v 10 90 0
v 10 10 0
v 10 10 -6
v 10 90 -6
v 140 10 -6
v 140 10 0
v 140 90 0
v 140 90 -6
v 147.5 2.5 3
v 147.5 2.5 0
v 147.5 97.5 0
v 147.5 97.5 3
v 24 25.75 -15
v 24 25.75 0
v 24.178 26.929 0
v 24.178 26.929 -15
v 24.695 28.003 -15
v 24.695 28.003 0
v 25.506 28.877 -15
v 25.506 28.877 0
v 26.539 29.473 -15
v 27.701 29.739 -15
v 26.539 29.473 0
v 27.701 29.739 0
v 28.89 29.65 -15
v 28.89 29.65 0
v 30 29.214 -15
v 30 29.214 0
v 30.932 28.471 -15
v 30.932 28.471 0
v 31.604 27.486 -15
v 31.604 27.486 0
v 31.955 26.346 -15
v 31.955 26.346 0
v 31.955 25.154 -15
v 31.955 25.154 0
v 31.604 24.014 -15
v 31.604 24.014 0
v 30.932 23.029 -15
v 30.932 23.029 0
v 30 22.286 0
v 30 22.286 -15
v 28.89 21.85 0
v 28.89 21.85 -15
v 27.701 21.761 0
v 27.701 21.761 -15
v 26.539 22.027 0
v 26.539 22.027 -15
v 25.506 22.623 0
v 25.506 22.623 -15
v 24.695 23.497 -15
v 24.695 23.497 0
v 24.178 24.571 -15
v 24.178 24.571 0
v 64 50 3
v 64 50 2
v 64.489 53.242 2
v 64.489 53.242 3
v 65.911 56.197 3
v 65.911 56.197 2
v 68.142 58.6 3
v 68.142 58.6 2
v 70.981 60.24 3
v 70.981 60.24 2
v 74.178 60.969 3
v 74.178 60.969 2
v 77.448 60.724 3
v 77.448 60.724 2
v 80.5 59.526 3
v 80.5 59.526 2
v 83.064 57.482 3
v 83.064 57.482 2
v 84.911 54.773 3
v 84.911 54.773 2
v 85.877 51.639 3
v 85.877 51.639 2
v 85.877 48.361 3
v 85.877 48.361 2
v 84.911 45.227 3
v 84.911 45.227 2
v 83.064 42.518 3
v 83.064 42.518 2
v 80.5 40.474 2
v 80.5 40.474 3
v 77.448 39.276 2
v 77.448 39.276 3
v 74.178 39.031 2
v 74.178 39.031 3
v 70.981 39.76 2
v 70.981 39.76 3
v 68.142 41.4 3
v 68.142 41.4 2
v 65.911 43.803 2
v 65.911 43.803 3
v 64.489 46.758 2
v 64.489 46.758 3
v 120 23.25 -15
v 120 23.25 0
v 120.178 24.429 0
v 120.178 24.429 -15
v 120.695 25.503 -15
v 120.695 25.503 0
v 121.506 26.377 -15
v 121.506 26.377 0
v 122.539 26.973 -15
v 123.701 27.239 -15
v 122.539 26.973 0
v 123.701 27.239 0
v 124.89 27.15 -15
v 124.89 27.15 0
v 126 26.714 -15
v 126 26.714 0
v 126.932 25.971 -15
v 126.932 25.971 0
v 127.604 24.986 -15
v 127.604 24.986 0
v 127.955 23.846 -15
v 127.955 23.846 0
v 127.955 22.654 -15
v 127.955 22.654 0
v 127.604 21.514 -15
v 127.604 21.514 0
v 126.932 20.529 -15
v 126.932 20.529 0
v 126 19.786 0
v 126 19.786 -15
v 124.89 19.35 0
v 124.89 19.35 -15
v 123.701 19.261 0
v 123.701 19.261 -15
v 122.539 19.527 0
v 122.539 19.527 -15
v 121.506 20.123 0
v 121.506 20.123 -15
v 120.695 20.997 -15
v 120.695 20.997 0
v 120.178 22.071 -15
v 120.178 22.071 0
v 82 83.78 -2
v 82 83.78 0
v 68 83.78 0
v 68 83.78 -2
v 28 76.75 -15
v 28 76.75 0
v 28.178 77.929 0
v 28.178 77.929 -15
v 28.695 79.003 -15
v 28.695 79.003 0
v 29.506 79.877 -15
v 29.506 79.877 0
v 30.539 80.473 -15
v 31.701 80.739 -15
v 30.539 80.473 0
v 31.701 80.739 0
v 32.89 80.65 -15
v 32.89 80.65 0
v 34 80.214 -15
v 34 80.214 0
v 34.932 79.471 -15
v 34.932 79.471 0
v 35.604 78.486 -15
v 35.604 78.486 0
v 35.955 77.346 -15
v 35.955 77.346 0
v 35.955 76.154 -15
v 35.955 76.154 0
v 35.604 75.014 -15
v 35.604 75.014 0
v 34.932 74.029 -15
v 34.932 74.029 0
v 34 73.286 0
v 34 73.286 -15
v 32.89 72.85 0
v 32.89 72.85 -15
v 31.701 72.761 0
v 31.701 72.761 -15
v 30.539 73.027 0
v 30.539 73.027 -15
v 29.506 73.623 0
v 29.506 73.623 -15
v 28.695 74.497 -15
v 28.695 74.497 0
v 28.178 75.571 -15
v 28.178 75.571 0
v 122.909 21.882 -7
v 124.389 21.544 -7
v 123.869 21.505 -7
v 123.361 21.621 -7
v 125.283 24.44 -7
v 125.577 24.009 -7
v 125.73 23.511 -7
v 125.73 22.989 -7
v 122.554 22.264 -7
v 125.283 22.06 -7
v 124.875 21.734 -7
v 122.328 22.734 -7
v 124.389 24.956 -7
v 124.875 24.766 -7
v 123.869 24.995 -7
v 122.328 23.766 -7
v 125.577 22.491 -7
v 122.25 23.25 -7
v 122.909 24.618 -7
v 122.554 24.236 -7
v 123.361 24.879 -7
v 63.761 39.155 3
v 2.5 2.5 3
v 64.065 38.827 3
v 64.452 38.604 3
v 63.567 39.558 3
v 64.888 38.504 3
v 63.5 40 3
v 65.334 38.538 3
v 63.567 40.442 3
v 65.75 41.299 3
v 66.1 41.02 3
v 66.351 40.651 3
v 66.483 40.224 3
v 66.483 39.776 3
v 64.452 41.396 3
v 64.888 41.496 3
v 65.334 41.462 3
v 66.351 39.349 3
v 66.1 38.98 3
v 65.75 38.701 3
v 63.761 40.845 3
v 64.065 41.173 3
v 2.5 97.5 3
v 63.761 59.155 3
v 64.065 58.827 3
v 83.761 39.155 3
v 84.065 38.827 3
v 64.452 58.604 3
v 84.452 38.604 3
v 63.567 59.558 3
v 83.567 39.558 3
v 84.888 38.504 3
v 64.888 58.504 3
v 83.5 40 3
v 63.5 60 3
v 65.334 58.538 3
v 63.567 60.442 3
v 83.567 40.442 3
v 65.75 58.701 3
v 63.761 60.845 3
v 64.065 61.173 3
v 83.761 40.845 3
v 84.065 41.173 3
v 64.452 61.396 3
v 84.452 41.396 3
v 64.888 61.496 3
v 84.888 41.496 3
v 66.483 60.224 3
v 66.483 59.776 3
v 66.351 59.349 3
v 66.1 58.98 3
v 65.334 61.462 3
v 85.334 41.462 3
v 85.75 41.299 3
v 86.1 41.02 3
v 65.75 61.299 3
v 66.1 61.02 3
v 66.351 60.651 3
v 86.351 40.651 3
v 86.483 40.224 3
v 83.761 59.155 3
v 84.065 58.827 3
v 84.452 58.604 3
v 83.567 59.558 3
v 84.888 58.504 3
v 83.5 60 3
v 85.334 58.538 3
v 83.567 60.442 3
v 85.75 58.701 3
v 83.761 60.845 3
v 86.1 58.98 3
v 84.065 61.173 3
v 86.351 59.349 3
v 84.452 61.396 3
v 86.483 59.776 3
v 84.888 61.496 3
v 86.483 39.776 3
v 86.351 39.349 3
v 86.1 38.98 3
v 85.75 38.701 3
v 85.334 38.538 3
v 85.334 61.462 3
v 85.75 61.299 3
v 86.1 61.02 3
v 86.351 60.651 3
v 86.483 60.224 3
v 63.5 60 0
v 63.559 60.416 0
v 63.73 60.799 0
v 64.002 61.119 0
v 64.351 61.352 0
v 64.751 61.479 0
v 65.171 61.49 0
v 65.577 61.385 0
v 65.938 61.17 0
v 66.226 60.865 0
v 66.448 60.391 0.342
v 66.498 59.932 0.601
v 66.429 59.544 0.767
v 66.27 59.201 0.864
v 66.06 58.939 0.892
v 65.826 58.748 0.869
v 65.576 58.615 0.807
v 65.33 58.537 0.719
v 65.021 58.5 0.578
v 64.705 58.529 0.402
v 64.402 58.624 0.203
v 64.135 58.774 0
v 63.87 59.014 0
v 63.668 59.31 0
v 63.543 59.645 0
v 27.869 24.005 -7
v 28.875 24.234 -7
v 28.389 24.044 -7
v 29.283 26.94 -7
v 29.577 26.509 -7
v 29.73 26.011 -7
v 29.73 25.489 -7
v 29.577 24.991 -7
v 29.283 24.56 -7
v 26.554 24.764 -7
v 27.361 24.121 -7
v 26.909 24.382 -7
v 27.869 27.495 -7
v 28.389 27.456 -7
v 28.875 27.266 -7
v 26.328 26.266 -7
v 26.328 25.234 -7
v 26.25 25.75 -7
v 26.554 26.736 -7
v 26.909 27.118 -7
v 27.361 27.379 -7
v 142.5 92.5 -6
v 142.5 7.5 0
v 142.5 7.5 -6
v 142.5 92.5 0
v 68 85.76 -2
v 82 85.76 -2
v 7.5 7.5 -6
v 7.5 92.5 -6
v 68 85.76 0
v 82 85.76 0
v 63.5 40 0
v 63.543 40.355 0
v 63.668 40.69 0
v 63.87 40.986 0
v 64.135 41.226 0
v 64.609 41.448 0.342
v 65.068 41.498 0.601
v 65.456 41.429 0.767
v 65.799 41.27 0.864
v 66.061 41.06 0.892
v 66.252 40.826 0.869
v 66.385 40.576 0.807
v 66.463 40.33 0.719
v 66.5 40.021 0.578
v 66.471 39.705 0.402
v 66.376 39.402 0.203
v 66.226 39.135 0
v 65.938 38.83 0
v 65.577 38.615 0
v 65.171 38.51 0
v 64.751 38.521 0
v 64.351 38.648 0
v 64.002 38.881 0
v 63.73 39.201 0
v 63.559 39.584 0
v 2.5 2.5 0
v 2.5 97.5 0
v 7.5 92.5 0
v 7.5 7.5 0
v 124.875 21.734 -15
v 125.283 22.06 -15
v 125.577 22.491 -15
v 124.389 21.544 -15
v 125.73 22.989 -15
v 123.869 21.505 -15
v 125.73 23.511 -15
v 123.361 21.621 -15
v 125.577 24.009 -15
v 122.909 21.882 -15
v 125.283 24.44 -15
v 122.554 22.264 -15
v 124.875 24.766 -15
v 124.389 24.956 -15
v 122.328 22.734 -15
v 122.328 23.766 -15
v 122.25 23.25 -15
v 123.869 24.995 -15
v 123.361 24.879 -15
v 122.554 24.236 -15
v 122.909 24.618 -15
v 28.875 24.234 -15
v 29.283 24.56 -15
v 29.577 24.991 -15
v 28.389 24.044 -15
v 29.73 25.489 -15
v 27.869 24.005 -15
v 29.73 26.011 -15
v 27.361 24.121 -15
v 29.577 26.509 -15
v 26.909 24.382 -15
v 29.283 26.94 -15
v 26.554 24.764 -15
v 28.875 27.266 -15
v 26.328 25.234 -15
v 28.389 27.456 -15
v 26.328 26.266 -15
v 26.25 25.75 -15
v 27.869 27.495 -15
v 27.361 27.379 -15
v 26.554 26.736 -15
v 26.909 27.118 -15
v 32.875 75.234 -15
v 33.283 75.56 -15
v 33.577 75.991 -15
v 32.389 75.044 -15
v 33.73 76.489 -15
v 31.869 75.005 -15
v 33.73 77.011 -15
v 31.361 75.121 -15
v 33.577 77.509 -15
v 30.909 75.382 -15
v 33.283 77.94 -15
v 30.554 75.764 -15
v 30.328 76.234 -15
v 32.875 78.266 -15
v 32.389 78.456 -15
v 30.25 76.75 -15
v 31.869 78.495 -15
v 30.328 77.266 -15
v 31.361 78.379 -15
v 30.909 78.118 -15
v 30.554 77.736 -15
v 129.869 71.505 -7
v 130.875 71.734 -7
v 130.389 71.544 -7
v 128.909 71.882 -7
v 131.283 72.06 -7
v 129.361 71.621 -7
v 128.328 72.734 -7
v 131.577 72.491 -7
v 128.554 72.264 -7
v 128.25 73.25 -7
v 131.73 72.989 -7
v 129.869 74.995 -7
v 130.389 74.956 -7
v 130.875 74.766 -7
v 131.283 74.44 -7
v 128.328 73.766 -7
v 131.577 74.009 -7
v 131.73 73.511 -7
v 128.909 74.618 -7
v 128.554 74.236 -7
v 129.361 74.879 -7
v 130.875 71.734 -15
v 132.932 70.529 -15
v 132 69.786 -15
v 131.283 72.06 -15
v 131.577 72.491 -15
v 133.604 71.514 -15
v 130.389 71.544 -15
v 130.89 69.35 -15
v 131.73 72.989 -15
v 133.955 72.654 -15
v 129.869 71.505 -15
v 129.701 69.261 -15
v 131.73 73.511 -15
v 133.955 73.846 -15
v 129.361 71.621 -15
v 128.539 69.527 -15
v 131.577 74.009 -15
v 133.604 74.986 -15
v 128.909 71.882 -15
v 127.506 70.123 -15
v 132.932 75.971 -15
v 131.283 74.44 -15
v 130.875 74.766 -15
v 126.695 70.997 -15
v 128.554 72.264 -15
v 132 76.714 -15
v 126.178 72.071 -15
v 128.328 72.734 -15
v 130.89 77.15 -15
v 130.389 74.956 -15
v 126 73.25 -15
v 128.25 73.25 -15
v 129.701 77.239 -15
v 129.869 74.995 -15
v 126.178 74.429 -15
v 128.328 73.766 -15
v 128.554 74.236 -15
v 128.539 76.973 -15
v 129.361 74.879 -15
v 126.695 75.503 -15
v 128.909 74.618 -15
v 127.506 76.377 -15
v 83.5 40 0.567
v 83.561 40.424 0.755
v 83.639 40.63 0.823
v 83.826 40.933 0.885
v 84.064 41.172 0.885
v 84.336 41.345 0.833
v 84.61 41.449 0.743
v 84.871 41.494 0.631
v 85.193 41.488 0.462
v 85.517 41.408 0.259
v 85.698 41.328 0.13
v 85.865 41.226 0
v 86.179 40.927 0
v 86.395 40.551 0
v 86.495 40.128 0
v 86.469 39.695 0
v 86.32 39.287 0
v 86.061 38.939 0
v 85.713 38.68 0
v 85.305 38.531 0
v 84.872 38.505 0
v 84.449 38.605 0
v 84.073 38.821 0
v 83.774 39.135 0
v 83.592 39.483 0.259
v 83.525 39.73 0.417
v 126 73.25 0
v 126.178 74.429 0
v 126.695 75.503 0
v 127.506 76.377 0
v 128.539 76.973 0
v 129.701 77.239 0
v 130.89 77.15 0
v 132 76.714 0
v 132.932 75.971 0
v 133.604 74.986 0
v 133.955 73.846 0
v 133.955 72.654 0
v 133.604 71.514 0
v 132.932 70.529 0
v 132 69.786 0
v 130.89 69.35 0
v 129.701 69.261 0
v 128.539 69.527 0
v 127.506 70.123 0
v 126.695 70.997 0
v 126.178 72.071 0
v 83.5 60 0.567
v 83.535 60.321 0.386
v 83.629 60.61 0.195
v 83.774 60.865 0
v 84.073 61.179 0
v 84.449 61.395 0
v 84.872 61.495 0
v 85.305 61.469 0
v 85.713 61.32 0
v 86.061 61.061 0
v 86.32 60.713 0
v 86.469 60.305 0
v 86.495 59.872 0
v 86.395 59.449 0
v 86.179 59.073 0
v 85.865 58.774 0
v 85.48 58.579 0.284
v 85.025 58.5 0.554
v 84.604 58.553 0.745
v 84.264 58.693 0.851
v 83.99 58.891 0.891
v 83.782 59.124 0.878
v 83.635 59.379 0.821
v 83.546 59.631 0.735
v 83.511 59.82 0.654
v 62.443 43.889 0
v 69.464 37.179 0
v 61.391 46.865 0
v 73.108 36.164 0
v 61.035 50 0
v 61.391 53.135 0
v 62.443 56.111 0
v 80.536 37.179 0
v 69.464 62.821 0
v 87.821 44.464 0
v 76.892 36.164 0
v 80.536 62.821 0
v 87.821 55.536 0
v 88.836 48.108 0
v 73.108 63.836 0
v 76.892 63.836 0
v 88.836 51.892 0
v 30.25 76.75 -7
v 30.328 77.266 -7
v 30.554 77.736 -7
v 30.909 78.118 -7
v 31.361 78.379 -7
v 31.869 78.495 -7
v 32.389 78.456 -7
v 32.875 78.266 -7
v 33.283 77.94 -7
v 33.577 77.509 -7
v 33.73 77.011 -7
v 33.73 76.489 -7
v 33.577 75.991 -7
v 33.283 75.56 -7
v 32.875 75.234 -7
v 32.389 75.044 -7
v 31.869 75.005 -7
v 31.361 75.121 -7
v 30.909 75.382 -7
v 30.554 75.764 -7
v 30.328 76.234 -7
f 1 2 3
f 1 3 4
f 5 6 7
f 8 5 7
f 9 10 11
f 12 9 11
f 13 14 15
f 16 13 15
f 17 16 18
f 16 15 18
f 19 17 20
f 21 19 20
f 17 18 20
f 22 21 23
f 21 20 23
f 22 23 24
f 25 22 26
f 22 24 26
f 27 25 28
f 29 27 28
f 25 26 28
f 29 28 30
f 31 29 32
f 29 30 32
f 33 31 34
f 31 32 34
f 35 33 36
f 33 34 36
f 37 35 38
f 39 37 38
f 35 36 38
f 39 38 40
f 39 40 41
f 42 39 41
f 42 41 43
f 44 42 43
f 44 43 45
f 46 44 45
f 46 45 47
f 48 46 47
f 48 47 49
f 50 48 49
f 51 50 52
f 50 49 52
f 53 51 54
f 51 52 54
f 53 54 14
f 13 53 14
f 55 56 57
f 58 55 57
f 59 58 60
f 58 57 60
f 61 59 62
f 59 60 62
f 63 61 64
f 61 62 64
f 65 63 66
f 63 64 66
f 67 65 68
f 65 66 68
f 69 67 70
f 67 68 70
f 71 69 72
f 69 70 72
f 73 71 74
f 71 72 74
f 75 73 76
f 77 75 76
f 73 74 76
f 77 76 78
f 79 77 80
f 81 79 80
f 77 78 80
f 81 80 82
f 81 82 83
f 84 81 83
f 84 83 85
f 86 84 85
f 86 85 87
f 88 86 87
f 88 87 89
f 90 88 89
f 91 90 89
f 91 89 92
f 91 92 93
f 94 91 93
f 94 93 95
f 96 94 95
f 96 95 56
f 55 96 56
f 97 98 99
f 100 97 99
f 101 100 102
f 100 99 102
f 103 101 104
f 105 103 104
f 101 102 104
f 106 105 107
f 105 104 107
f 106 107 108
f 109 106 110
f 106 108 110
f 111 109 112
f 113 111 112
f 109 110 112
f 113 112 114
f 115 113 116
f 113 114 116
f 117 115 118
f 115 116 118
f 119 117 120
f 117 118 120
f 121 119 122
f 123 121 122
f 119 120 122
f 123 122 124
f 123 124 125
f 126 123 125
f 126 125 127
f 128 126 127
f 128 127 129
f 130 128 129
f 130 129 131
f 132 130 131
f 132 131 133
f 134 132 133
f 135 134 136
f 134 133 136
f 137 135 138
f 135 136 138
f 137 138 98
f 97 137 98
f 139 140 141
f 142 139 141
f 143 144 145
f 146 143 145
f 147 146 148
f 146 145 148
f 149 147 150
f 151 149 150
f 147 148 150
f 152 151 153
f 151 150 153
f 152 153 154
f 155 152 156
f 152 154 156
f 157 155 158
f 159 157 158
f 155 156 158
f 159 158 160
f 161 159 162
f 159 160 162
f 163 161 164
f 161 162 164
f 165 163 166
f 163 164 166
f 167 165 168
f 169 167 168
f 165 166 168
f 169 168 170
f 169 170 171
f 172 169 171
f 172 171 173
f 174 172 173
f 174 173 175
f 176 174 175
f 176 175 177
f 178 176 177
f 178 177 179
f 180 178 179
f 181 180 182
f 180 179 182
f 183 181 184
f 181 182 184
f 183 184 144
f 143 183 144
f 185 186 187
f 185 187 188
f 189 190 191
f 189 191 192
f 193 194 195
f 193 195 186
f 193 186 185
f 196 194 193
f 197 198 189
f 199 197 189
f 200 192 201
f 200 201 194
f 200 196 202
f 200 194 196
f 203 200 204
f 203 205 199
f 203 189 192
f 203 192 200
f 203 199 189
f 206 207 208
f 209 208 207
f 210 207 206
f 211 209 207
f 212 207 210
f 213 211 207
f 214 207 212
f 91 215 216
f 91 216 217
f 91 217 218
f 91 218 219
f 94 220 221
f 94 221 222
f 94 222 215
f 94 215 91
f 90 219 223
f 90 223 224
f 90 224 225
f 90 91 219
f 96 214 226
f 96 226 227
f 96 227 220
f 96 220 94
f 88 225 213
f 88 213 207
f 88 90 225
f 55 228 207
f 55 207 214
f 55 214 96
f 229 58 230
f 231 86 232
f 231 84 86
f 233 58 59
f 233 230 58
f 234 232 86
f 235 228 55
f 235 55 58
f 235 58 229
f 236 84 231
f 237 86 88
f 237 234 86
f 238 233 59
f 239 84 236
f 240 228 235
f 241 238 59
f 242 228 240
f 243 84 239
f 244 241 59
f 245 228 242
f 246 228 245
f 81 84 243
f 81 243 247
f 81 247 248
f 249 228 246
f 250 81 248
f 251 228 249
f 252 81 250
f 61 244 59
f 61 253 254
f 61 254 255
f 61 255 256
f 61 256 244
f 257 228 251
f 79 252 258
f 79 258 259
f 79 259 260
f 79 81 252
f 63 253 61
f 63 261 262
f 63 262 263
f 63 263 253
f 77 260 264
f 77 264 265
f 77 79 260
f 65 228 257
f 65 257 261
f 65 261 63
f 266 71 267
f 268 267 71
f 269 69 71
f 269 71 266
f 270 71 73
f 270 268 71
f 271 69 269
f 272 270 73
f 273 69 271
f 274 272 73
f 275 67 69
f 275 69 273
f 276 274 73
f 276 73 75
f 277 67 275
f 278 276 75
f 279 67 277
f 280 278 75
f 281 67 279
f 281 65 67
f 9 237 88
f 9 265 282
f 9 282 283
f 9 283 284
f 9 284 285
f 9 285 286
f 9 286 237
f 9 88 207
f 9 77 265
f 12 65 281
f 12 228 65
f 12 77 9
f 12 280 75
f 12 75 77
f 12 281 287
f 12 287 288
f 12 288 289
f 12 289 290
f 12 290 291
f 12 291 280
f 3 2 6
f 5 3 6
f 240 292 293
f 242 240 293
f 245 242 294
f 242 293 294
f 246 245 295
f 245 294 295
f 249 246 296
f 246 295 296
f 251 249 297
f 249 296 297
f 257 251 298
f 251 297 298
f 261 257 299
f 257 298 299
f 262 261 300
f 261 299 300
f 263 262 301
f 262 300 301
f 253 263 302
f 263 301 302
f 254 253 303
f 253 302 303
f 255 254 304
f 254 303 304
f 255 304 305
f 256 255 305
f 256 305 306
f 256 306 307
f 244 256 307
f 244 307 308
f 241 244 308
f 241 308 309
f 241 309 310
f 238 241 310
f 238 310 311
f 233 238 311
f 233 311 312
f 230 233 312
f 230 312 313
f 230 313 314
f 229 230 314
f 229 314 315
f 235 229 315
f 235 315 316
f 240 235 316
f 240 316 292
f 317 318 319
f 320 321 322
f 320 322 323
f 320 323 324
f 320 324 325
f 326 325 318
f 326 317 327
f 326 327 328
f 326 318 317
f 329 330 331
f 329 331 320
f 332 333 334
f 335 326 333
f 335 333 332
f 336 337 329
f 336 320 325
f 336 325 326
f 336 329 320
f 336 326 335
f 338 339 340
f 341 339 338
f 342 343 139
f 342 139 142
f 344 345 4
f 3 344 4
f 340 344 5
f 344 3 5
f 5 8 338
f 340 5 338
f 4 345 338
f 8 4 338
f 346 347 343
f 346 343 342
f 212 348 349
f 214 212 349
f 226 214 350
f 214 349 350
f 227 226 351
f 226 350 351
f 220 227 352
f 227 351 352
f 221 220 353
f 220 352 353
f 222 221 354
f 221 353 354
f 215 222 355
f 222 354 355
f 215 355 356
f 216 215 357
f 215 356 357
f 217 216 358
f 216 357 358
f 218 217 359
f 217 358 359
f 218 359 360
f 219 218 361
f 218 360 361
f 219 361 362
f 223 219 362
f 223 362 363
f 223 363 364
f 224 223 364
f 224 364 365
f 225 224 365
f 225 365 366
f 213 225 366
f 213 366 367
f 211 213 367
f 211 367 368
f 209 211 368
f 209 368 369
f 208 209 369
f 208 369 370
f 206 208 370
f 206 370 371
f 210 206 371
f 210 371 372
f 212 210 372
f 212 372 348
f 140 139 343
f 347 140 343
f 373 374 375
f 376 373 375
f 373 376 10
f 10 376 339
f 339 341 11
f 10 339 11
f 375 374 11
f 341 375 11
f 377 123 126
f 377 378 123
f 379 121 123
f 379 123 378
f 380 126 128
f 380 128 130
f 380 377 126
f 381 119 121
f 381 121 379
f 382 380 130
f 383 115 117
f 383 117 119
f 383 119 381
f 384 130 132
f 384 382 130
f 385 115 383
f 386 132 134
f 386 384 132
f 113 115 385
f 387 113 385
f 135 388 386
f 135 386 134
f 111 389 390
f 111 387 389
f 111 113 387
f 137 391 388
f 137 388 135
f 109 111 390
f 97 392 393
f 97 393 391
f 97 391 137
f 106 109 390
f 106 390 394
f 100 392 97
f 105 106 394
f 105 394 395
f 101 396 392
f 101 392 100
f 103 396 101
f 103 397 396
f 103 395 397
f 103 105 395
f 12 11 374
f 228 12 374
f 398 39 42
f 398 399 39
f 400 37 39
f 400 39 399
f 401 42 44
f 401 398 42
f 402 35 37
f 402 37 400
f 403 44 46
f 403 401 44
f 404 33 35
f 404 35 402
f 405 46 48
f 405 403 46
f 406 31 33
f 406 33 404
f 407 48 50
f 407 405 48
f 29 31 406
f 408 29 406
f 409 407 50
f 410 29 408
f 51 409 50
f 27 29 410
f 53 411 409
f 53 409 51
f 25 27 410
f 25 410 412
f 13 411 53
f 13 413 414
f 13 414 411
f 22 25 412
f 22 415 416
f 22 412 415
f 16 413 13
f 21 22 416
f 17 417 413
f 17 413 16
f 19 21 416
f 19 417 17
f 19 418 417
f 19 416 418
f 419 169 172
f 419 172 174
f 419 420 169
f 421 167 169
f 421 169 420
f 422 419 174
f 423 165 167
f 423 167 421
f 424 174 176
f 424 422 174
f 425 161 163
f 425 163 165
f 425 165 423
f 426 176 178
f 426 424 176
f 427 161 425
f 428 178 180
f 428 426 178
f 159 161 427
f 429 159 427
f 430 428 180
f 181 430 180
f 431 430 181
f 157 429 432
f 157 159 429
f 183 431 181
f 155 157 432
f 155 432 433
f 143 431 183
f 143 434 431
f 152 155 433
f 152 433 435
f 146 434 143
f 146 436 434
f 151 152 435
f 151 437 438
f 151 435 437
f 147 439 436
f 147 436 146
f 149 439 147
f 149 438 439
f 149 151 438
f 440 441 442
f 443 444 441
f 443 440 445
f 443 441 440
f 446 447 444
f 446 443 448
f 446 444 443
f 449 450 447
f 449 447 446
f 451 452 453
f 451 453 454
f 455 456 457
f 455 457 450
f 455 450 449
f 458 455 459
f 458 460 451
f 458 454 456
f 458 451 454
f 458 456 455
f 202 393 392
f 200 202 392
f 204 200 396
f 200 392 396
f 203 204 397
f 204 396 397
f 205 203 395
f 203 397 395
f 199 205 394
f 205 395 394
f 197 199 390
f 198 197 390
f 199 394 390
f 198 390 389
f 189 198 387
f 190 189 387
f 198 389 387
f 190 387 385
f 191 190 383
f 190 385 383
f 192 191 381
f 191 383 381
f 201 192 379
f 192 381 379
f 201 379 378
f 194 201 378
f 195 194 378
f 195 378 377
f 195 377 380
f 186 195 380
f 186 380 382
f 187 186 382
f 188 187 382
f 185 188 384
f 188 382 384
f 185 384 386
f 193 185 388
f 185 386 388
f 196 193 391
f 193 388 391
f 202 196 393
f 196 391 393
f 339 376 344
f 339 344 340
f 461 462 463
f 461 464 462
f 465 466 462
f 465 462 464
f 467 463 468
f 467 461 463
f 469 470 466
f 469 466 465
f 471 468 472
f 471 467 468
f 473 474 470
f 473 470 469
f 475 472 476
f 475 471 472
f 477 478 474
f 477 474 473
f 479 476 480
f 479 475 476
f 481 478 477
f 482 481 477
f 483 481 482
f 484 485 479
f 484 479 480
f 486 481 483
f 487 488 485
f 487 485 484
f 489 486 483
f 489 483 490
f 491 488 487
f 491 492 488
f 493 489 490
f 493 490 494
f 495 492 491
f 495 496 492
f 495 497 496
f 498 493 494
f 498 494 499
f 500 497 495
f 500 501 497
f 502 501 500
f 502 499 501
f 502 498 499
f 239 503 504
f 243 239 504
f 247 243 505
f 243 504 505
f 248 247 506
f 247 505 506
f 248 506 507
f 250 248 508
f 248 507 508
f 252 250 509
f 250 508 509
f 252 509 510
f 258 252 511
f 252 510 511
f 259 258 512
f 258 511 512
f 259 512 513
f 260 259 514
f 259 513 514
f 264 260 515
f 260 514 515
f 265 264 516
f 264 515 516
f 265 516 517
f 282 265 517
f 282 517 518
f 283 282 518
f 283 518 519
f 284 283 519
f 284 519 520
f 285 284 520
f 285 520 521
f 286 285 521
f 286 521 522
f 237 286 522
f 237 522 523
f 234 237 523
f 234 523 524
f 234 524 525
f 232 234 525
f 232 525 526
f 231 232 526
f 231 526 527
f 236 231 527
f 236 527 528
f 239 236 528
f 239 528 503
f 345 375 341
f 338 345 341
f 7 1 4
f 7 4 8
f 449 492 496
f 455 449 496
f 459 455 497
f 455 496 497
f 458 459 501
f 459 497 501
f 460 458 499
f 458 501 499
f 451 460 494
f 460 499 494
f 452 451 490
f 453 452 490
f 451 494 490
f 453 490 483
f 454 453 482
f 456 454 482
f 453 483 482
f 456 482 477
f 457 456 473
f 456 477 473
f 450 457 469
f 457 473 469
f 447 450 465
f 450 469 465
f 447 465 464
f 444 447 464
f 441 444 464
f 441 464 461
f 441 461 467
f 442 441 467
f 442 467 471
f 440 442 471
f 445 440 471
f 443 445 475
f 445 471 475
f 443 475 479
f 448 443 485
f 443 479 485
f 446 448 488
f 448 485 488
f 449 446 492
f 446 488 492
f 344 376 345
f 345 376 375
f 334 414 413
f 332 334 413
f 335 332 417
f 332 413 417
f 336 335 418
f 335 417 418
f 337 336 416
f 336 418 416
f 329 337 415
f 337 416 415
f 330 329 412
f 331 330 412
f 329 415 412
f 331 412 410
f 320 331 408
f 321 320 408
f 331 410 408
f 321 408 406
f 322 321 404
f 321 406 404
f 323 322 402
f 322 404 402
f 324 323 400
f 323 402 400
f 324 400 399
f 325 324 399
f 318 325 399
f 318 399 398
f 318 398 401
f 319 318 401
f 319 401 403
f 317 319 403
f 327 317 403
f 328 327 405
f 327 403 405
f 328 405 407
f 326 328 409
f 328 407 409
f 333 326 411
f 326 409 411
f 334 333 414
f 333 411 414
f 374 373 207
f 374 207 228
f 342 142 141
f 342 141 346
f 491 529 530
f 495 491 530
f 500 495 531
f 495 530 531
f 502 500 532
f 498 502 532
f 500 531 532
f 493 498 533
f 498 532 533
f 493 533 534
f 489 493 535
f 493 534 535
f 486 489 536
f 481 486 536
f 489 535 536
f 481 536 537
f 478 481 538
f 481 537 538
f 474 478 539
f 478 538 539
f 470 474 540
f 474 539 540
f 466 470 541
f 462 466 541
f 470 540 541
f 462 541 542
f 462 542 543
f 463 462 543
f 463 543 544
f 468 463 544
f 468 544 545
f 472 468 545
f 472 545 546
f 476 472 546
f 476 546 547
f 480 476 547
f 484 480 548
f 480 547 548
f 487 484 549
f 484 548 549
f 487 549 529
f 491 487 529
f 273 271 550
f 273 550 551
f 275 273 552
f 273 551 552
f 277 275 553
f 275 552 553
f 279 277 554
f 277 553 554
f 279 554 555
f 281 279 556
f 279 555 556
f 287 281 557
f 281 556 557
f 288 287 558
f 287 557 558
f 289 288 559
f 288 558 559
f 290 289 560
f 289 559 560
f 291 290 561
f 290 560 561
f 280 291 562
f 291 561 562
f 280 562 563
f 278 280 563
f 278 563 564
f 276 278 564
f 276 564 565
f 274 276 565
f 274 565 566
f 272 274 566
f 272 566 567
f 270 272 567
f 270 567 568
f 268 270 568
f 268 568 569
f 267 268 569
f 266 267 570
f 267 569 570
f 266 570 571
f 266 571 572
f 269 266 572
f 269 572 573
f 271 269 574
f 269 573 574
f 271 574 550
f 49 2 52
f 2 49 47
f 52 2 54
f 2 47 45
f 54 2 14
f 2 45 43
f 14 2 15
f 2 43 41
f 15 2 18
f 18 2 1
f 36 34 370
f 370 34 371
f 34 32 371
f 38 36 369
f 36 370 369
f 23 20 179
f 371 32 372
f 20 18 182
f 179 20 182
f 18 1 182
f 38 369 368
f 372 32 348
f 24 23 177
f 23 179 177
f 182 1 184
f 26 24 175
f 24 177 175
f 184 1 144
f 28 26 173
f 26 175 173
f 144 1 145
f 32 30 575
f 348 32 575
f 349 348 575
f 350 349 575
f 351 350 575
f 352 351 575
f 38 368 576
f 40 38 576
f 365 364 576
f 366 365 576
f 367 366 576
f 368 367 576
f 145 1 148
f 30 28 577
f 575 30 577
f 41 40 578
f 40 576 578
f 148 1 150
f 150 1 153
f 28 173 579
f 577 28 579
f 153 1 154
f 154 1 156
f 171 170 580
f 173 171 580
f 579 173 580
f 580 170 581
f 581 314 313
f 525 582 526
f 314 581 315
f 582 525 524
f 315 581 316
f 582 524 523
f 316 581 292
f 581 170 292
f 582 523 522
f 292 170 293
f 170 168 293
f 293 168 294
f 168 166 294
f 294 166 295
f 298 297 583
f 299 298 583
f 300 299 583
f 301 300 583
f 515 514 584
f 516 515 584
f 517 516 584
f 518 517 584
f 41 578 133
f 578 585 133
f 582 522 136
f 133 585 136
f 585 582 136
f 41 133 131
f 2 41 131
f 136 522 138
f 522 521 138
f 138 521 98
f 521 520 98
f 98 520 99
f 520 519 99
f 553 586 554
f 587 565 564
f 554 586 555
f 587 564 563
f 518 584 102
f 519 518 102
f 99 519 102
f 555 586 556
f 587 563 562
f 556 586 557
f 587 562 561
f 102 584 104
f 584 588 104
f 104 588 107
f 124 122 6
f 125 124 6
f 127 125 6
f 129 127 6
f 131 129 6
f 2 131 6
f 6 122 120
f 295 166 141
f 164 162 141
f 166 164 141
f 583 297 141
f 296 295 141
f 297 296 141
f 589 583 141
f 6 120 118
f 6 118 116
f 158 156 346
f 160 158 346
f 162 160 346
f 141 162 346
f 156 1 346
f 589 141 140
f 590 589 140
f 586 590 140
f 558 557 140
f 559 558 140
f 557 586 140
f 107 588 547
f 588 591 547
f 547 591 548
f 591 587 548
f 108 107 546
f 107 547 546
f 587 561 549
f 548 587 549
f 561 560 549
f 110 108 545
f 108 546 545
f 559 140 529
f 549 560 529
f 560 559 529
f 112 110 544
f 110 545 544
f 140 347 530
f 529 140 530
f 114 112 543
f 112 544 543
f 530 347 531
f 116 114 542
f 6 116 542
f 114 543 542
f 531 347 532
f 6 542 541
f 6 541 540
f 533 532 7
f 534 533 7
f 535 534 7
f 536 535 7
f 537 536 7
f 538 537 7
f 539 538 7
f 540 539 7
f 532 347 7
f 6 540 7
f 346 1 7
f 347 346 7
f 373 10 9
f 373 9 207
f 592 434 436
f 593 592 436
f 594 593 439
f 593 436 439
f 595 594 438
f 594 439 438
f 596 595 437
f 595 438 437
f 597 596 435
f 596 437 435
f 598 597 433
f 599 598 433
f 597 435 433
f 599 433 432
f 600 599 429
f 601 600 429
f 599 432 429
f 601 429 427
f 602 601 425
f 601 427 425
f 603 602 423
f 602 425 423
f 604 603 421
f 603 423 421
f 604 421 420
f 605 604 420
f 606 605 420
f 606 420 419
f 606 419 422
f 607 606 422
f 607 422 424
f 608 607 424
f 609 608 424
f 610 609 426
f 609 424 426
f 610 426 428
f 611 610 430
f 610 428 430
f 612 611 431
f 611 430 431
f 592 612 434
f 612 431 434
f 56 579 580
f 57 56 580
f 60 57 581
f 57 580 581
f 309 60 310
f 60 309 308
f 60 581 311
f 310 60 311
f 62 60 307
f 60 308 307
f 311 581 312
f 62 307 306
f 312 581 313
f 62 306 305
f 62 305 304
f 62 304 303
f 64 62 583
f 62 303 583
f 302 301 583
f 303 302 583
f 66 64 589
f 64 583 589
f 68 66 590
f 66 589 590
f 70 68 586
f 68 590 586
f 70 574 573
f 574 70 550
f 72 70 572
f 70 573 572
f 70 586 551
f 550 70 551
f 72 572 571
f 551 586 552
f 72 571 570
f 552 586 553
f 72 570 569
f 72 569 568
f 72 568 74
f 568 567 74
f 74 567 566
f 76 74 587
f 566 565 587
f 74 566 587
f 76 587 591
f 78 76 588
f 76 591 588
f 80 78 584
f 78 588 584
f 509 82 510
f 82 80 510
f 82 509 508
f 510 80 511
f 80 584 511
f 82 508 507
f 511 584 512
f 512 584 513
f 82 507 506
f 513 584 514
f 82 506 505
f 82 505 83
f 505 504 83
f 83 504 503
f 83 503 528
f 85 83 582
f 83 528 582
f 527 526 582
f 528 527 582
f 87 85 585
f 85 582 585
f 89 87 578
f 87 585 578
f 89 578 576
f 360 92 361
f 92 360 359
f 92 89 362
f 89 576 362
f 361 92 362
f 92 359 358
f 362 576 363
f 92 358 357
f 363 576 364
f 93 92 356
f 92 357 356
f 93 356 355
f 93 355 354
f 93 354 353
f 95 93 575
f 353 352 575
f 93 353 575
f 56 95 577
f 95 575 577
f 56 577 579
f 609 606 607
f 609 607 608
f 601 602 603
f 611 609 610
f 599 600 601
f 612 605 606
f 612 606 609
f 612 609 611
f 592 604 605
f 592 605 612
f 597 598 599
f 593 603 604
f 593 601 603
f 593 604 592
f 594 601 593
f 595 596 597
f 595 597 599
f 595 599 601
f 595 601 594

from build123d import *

# Parameters (mm, degrees)
ESBO_O1_W                = 150
ESBO_O1_H                = 100
RESSALTO_EXTRUS_O1_DEPTH = 3
ESBO_O1_3_W              = 135
ESBO_O1_3_H              = 85
ESBO_O1_3_W_2            = 130
ESBO_O1_3_H_2            = 80
RESSALTO_EXTRUS_O2_DEPTH = 6
ESBO_O2_R                = 4
RESSALTO_EXTRUS_O3_DEPTH = 15
ESBO_O3_R                = 1.75
CORTE_EXTRUS_O1_DEPTH    = 8
ESBO_O4_W                = 14
ESBO_O4_H                = 1.980707968
RESSALTO_EXTRUS_O4_DEPTH = 2
ESBO_O5_R                = 11
ESBO_O5_R_2              = 1.5
CORTE_EXTRUS_O2_DEPTH    = 10
CHANFRO1_SIZE            = 2
CHANFRO1_SIZE_2          = 2.965121937
ESBO_O6_W                = 150
ESBO_O6_H                = 100
ESBO_O6_W_2              = 145
ESBO_O6_H_2              = 95
CORTE_EXTRUS_O3_DEPTH    = 10


with BuildPart() as part:
    # Esboço1 → Ressalto-extrusão1 (new body)
    with BuildSketch(Plane.XY):
        with Locations((75, 50)):
            Rectangle(ESBO_O1_W, ESBO_O1_H)
    extrude(amount=RESSALTO_EXTRUS_O1_DEPTH)

    # Esboço1<3> → Ressalto-extrusão2 (add)
    with BuildSketch(Plane.XY):
        with Locations((75, 50)):
            Rectangle(ESBO_O1_3_W, ESBO_O1_3_H)
        with Locations((75, 50)):
            Rectangle(ESBO_O1_3_W_2, ESBO_O1_3_H_2, mode=Mode.SUBTRACT)
    extrude(amount=-RESSALTO_EXTRUS_O2_DEPTH)

    # Esboço2 → Ressalto-extrusão3 (add)
    with BuildSketch(Plane(origin=(0, 0, 0), x_dir=(-1, 0, 0), z_dir=(0, 0, -1))):
        with Locations((-130, 73.25)):
            Circle(ESBO_O2_R)
        with Locations((-32, 76.75)):
            Circle(ESBO_O2_R)
        with Locations((-28, 25.75)):
            Circle(ESBO_O2_R)
        with Locations((-124, 23.25)):
            Circle(ESBO_O2_R)
    extrude(amount=RESSALTO_EXTRUS_O3_DEPTH)

    # Esboço3 → Corte-extrusão1 (cut)
    with BuildSketch(Plane(origin=(0, 0, -15), x_dir=(-1, 0, 0), z_dir=(0, 0, -1))):
        with Locations((-130, 73.25)):
            Circle(ESBO_O3_R)
        with Locations((-32, 76.75)):
            Circle(ESBO_O3_R)
        with Locations((-28, 25.75)):
            Circle(ESBO_O3_R)
        with Locations((-124, 23.25)):
            Circle(ESBO_O3_R)
    extrude(amount=-CORTE_EXTRUS_O1_DEPTH, mode=Mode.SUBTRACT)

    # Esboço4 → Ressalto-extrusão4 (add)
    with BuildSketch(Plane(origin=(0, 0, 0), x_dir=(-1, 0, 0), z_dir=(0, 0, -1))):
        with Locations((-75, 84.770026355)):
            Rectangle(ESBO_O4_W, ESBO_O4_H)
    extrude(amount=RESSALTO_EXTRUS_O4_DEPTH)

    # Esboço5 → Corte-extrusão2 (cut)
    with BuildSketch(Plane(origin=(0, 0, 0), x_dir=(-1, 0, 0), z_dir=(0, 0, -1))):
        with Locations((-75, 50)):
            Circle(ESBO_O5_R)
        with Locations((-85, 60)):
            Circle(ESBO_O5_R_2)
        with Locations((-65, 40)):
            Circle(ESBO_O5_R_2)
        with Locations((-85, 40)):
            Circle(ESBO_O5_R_2)
        with Locations((-65, 60)):
            Circle(ESBO_O5_R_2)
    extrude(amount=-CORTE_EXTRUS_O2_DEPTH, mode=Mode.SUBTRACT)

    # Chanfro1
    # the kernel refuses this chamfer: 2.965121937, 2 mm, written as the material it takes off along each edge
    with BuildSketch(Plane(origin=(75, 50, 0), x_dir=(-1, 0, 0), z_dir=(0, -1, 0))) as chanfro1_piece_1:
        Polygon((11, -CHANFRO1_SIZE), (11 + CHANFRO1_SIZE_2, 0), (11, 0), align=None)
    revolve(axis=Axis((75, 50, 0), (0, 0, -1)), mode=Mode.SUBTRACT)

    # Esboço6 → Corte-extrusão3 (cut)
    with BuildSketch(Plane(origin=(0, 0, 0), x_dir=(-1, 0, 0), z_dir=(0, 0, -1))):
        with Locations((-75, 50)):
            Rectangle(ESBO_O6_W, ESBO_O6_H)
        with Locations((-75, 50)):
            Rectangle(ESBO_O6_W_2, ESBO_O6_H_2, mode=Mode.SUBTRACT)
    extrude(amount=-CORTE_EXTRUS_O3_DEPTH, mode=Mode.SUBTRACT)


solid = part.part
